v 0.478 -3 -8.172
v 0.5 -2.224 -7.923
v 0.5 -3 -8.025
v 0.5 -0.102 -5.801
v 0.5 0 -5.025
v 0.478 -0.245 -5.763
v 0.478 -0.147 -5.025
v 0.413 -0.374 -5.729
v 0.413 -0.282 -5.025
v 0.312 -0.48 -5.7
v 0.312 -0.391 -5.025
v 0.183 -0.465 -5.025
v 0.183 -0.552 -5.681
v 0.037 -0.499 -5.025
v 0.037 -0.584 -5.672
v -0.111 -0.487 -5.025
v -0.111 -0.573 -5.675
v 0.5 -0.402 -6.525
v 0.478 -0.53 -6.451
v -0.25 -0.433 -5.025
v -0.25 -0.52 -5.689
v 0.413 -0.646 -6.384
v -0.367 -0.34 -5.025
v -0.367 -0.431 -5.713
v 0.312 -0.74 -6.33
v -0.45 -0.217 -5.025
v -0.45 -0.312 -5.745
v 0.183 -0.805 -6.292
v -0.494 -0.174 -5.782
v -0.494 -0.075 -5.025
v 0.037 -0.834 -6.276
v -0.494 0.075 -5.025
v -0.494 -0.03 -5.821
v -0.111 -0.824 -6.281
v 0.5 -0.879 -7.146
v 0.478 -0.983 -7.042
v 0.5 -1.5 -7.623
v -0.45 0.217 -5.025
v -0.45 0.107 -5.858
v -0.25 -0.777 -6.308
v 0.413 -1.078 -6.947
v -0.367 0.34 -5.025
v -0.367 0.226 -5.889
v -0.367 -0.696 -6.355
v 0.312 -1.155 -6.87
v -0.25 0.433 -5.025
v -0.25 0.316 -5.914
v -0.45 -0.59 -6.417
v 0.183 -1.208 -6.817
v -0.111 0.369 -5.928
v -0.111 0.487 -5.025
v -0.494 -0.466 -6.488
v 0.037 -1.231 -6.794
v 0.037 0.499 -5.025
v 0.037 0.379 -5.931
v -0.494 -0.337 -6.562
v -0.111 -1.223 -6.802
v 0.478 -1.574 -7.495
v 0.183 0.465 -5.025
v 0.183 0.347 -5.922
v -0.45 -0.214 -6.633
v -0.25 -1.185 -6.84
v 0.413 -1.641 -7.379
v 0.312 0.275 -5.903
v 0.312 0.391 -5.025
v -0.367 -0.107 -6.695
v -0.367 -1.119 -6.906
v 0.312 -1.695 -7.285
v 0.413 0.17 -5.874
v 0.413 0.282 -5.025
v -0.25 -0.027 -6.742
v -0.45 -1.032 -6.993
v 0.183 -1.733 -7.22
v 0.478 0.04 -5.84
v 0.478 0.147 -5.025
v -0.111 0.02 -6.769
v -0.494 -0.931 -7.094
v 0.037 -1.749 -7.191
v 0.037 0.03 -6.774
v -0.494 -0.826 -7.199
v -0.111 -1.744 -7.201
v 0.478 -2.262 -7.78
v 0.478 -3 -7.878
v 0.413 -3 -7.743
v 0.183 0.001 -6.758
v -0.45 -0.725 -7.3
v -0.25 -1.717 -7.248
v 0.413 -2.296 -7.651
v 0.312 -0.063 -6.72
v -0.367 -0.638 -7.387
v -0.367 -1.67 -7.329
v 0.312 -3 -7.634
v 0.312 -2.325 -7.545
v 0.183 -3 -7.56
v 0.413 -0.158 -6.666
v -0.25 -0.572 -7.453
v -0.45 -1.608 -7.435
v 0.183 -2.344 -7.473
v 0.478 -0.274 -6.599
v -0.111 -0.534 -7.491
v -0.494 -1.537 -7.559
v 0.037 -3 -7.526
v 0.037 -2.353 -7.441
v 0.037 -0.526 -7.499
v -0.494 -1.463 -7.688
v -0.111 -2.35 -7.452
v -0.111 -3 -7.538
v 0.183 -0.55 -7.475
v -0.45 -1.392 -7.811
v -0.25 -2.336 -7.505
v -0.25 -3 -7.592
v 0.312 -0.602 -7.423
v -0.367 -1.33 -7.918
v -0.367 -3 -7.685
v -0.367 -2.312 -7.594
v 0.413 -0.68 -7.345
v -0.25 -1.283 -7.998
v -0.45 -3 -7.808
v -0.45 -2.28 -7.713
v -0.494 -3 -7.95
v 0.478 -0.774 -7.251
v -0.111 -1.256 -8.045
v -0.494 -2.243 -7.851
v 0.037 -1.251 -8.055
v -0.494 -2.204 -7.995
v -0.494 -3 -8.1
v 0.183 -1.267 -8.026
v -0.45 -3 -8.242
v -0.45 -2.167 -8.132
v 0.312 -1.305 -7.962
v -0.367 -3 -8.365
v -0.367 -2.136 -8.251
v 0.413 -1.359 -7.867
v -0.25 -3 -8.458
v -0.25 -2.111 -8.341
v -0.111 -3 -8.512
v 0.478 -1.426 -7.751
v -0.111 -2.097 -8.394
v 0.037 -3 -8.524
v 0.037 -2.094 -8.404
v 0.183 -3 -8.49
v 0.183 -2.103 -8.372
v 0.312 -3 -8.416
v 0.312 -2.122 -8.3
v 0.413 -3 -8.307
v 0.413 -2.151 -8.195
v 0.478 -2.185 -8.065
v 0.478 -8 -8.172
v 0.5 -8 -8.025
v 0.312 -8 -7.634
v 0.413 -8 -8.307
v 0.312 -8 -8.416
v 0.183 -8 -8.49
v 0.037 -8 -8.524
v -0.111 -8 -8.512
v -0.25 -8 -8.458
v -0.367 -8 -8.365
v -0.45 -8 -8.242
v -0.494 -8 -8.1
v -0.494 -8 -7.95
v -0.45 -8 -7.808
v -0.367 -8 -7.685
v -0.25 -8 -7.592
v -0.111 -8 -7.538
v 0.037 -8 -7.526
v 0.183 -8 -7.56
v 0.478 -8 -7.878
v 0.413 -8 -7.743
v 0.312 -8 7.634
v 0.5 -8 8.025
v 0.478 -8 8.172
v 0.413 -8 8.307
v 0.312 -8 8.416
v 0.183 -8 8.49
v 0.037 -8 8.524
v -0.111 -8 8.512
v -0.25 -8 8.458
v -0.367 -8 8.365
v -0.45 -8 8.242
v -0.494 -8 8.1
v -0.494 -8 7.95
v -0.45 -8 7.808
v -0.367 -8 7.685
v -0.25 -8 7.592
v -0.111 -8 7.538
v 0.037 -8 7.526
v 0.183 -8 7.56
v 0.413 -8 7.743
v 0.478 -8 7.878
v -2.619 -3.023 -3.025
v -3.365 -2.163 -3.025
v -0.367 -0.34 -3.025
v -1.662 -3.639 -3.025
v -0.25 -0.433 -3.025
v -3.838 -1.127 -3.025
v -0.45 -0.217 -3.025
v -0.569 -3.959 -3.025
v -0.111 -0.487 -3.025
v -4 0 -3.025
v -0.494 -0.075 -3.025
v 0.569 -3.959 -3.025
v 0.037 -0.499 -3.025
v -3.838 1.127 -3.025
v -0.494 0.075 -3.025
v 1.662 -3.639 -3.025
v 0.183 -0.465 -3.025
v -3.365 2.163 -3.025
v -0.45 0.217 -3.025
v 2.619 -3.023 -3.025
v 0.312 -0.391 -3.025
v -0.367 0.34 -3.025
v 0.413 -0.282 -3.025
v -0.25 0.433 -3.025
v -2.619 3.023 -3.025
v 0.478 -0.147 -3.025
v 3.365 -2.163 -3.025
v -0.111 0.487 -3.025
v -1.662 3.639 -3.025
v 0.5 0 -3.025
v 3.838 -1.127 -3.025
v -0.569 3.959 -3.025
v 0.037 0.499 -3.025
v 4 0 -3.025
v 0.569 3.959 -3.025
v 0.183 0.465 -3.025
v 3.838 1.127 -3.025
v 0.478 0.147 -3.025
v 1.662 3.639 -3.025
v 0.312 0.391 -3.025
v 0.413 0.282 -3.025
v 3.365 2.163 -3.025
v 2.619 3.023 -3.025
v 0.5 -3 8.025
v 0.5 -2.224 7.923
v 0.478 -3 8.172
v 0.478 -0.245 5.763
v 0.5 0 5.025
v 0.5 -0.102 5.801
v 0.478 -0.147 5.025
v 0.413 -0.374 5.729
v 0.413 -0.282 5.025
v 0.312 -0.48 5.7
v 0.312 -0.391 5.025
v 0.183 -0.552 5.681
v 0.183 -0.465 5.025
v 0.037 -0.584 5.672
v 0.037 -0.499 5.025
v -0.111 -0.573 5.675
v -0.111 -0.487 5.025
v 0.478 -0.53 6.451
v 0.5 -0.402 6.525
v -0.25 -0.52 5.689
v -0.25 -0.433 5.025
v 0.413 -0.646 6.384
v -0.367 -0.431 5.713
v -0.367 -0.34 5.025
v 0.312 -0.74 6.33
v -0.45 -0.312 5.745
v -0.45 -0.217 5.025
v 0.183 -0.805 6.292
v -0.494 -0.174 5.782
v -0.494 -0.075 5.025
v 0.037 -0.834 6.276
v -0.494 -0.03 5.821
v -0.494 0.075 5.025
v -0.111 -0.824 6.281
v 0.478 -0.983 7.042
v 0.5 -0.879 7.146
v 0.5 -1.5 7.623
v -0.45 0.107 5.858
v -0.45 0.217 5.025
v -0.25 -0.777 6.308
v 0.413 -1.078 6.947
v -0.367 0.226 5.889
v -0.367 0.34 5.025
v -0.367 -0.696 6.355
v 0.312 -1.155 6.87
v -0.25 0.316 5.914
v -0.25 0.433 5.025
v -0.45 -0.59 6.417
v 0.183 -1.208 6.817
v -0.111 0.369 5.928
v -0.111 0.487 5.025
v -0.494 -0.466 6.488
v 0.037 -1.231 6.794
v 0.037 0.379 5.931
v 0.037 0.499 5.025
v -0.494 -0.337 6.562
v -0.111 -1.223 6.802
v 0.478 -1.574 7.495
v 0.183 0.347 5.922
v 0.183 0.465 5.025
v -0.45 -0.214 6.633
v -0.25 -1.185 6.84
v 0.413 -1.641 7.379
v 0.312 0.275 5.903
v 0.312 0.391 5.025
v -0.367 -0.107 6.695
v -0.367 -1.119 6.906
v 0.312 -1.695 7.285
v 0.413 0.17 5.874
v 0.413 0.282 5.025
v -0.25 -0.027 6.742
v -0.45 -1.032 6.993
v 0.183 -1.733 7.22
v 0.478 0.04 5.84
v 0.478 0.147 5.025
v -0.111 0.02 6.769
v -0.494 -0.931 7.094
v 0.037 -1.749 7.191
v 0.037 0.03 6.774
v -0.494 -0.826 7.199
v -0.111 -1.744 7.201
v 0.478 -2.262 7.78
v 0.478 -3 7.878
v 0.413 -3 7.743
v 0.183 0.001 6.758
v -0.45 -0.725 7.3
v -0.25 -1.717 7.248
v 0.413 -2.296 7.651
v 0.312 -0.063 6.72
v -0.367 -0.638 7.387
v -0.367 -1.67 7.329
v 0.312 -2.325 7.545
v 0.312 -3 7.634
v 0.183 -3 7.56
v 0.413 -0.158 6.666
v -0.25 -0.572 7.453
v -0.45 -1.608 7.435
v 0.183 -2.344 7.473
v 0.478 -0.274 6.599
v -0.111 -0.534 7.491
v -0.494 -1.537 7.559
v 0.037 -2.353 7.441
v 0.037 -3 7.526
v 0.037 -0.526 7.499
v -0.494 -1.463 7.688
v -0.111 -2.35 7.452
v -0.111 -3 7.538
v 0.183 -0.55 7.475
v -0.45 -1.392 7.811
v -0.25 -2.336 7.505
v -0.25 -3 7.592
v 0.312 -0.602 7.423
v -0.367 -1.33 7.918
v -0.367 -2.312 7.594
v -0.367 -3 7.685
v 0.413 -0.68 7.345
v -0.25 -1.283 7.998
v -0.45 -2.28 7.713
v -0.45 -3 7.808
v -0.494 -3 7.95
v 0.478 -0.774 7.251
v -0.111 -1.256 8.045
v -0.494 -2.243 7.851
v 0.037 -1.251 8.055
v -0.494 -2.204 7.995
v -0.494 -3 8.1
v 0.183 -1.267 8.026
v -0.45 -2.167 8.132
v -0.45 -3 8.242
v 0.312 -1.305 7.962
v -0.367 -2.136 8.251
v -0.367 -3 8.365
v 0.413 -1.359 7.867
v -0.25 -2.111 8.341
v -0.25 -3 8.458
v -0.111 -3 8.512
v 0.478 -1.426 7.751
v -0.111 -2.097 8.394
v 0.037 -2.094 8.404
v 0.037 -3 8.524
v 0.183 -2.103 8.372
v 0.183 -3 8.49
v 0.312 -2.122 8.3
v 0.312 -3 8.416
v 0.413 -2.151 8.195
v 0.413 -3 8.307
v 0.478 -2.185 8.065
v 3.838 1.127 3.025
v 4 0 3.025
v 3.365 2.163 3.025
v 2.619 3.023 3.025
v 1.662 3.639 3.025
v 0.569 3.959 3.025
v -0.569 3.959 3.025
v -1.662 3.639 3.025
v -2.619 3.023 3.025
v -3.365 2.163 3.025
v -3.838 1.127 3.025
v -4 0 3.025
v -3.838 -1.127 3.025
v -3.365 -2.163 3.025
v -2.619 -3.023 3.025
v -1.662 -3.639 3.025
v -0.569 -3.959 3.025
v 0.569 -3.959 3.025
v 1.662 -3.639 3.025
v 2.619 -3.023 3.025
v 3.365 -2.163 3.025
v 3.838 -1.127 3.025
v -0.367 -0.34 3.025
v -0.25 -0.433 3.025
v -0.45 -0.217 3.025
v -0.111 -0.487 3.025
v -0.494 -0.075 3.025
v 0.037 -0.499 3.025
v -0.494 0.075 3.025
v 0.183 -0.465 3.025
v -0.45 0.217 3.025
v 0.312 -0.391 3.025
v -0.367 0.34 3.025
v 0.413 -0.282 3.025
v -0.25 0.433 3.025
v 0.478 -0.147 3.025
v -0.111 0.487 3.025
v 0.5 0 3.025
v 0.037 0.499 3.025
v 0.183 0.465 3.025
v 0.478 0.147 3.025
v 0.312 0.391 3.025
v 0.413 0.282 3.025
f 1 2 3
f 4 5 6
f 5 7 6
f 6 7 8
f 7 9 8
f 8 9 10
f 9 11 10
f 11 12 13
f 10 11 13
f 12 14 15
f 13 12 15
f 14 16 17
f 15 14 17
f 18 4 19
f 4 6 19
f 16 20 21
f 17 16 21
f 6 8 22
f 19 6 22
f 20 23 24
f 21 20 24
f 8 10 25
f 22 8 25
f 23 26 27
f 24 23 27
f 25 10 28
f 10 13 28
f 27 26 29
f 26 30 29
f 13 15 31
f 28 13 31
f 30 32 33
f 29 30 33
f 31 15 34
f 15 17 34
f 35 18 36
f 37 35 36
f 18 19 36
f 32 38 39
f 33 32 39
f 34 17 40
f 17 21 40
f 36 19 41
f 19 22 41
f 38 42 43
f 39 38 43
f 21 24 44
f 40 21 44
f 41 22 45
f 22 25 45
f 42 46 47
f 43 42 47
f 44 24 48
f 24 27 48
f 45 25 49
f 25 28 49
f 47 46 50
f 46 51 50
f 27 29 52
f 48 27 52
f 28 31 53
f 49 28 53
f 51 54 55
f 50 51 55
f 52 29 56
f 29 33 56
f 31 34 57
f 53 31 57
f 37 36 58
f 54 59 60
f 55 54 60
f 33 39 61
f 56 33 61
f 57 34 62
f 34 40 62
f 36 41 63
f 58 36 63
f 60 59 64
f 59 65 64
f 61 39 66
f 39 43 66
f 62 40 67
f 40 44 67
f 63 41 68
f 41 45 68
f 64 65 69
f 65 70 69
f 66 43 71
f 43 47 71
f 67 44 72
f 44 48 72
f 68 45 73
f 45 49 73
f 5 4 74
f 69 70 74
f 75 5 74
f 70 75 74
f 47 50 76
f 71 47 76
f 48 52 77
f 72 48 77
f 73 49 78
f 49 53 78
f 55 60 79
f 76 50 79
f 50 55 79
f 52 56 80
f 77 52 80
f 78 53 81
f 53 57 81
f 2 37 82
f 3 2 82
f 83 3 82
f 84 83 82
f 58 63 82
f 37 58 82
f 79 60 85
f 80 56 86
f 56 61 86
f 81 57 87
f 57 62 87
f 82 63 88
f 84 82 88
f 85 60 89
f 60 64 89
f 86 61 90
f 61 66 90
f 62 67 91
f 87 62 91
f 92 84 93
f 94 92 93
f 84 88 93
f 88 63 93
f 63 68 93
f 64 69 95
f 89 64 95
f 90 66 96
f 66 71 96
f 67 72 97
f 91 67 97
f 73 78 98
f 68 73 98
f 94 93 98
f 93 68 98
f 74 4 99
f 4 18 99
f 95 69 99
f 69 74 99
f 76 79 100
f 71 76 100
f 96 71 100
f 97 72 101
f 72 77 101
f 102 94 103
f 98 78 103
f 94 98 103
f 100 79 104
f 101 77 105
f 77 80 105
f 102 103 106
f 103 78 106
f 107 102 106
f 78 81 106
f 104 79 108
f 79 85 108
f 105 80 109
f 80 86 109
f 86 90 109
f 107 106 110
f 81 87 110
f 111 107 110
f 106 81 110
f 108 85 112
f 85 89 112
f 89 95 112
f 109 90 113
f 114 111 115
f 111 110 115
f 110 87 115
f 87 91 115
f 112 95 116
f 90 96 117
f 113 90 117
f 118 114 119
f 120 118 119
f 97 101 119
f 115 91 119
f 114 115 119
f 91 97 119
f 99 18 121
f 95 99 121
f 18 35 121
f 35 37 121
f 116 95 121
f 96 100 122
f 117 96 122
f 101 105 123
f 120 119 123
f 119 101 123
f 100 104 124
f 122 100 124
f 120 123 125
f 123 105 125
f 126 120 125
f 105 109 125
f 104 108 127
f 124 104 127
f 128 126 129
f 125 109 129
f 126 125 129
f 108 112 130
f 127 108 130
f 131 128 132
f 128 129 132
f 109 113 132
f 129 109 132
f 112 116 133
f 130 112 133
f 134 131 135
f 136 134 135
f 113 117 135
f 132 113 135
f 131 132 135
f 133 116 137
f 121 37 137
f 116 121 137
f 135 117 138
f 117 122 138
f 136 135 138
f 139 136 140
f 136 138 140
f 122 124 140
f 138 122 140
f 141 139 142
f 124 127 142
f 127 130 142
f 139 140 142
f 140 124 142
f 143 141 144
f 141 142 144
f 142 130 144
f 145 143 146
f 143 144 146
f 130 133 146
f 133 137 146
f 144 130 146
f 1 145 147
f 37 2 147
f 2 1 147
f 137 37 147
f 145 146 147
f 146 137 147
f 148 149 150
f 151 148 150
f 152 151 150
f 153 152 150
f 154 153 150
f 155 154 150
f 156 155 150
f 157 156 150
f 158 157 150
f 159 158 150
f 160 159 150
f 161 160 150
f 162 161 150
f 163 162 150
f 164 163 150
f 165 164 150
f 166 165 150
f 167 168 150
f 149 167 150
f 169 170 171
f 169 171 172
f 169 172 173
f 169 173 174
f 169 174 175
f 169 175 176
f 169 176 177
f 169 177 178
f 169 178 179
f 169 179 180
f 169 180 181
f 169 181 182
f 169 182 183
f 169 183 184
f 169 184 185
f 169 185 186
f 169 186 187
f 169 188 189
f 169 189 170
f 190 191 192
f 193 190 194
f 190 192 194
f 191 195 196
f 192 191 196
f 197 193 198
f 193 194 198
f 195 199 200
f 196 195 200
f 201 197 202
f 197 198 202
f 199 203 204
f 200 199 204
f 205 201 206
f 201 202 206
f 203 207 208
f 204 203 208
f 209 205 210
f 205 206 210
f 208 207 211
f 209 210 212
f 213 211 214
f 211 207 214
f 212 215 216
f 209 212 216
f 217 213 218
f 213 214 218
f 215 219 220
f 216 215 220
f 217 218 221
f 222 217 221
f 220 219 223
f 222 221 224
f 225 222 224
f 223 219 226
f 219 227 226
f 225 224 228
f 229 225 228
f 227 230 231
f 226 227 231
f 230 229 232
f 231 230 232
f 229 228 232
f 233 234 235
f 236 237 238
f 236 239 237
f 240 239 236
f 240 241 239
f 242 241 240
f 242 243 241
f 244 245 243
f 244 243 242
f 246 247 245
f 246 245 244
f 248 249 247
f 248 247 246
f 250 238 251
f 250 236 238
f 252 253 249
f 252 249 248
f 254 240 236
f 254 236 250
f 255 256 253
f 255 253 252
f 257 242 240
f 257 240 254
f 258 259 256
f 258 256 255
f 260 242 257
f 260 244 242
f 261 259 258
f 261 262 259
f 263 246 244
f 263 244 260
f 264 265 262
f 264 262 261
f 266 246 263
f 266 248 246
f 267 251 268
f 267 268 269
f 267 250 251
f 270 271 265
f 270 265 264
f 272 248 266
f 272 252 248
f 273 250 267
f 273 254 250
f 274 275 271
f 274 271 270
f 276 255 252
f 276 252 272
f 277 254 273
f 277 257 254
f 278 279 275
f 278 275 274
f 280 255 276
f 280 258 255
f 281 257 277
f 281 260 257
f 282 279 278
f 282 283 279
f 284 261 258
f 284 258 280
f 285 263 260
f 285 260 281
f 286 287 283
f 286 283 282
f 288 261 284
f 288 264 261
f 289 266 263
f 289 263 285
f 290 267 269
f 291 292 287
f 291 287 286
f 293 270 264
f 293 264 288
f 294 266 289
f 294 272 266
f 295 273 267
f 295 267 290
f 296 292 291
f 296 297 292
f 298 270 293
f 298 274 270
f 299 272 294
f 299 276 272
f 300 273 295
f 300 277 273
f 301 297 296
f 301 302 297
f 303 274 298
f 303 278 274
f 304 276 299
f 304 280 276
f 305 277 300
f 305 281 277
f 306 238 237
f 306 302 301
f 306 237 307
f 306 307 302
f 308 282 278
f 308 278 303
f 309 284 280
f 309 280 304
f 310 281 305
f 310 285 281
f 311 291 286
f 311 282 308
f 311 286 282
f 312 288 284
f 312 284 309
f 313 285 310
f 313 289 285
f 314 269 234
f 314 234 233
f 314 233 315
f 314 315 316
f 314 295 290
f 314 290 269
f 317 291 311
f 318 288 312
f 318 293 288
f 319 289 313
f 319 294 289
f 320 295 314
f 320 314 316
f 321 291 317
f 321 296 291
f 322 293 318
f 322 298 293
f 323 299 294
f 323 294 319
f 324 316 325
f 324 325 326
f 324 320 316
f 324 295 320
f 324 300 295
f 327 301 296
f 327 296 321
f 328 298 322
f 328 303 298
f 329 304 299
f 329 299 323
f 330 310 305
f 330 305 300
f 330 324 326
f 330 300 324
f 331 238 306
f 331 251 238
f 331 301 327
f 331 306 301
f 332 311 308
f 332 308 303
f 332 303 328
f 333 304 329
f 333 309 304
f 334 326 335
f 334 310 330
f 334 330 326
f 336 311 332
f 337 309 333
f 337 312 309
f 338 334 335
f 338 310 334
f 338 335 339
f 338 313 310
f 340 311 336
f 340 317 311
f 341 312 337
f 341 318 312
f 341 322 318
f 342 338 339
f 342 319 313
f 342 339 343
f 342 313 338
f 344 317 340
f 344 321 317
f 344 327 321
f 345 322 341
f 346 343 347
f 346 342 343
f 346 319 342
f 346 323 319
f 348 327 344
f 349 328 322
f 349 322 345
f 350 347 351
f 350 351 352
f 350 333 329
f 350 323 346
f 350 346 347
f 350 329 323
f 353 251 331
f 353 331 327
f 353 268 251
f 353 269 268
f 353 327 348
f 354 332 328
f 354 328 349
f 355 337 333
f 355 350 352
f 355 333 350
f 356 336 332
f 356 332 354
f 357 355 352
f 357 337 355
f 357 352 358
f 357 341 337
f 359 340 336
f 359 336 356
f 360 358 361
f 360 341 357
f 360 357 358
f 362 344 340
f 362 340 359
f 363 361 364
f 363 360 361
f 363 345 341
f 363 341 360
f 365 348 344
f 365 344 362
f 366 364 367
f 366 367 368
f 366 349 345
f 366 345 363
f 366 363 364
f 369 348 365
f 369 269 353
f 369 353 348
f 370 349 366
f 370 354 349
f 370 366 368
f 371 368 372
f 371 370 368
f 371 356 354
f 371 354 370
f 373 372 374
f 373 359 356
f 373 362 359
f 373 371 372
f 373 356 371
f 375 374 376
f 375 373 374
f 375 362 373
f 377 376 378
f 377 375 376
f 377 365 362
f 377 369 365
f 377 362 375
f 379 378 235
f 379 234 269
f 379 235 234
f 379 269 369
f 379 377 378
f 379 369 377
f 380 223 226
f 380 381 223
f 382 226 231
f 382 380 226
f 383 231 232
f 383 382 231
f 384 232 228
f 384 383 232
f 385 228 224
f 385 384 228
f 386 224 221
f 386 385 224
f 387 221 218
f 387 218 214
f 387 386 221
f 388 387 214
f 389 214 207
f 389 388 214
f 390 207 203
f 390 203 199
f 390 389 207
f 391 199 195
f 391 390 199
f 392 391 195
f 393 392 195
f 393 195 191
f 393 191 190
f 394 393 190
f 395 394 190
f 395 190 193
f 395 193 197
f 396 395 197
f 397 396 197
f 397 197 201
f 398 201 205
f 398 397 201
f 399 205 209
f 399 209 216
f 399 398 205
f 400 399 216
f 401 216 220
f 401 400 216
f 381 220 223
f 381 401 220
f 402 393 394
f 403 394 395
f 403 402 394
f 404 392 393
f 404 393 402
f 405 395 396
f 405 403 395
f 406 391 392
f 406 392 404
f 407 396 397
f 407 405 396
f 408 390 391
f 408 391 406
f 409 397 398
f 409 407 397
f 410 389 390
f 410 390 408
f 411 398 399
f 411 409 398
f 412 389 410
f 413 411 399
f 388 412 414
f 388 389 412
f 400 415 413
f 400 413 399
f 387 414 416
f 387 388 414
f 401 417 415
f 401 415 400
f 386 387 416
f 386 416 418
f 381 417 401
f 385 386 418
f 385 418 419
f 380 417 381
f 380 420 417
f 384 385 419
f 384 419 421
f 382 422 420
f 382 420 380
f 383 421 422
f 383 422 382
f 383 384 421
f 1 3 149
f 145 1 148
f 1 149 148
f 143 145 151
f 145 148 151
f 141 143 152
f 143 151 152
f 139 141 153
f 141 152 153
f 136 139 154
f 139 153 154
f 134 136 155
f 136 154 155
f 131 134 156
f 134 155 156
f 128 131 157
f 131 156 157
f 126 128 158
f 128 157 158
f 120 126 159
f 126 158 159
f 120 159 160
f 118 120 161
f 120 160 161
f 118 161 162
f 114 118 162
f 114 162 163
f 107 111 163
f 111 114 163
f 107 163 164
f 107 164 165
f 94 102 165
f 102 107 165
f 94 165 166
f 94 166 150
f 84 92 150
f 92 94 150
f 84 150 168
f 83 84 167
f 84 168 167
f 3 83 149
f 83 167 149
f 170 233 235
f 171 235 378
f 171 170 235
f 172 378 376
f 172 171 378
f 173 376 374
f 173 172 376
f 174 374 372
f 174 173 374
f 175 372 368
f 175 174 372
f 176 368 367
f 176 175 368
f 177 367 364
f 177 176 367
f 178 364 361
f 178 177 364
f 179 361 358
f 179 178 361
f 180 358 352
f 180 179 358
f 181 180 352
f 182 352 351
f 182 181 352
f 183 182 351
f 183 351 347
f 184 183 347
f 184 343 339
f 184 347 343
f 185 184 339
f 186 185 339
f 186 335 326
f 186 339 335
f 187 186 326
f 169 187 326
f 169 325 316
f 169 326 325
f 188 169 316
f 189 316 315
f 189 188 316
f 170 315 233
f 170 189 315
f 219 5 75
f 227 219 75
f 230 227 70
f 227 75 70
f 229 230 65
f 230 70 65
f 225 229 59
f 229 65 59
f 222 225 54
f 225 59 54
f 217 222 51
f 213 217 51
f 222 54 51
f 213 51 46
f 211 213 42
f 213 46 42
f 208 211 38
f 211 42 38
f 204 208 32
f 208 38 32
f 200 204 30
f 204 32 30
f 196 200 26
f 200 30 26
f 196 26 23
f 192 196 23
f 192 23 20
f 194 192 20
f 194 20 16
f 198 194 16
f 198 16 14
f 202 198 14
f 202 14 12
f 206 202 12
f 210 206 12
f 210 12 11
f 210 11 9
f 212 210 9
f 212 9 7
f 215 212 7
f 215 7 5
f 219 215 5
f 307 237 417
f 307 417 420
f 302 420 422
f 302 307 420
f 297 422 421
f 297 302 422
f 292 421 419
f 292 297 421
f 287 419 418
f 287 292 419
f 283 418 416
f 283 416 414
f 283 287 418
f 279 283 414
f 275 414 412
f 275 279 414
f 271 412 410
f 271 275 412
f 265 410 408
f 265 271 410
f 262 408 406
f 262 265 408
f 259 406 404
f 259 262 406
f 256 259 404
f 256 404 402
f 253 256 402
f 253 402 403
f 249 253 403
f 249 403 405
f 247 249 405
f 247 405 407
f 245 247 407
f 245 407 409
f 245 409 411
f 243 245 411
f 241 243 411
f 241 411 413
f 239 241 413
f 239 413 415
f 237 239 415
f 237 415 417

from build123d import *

# Parameters (mm, degrees)
SKETCH1_R           = 4
BOSS_EXTRUDE1_DEPTH = 3.025
SKETCH3_R           = 0.5


with BuildPart() as part:
    # Sketch1 → Boss-Extrude1 (new, symmetric)
    with BuildSketch(Plane.XY):
        Circle(SKETCH1_R)
    extrude(amount=BOSS_EXTRUDE1_DEPTH, both=True)

    # Sweep1: sweep along a path in Sketch2
    with BuildLine(Plane(origin=(0, 0, 0), x_dir=(0, 0, -1), z_dir=(1, 0, 0))) as sweep1_path:
        Line((-3.025, 0), (-5.025, 0))
        ThreePointArc((-5.025, 0), (-7.146320344, -0.878679656), (-8.025, -3))
        Line((-8.025, -3), (-8.025, -8))
    # Sketch3 → Sweep1 (sweep)
    with BuildSketch(Plane.XY.offset(3.025)):
        Circle(SKETCH3_R)
    sweep1 = sweep(path=sweep1_path.line)

    # Mirror1: Sweep1 across plane
    add(sweep1.mirror(Plane.XY))


solid = part.part
